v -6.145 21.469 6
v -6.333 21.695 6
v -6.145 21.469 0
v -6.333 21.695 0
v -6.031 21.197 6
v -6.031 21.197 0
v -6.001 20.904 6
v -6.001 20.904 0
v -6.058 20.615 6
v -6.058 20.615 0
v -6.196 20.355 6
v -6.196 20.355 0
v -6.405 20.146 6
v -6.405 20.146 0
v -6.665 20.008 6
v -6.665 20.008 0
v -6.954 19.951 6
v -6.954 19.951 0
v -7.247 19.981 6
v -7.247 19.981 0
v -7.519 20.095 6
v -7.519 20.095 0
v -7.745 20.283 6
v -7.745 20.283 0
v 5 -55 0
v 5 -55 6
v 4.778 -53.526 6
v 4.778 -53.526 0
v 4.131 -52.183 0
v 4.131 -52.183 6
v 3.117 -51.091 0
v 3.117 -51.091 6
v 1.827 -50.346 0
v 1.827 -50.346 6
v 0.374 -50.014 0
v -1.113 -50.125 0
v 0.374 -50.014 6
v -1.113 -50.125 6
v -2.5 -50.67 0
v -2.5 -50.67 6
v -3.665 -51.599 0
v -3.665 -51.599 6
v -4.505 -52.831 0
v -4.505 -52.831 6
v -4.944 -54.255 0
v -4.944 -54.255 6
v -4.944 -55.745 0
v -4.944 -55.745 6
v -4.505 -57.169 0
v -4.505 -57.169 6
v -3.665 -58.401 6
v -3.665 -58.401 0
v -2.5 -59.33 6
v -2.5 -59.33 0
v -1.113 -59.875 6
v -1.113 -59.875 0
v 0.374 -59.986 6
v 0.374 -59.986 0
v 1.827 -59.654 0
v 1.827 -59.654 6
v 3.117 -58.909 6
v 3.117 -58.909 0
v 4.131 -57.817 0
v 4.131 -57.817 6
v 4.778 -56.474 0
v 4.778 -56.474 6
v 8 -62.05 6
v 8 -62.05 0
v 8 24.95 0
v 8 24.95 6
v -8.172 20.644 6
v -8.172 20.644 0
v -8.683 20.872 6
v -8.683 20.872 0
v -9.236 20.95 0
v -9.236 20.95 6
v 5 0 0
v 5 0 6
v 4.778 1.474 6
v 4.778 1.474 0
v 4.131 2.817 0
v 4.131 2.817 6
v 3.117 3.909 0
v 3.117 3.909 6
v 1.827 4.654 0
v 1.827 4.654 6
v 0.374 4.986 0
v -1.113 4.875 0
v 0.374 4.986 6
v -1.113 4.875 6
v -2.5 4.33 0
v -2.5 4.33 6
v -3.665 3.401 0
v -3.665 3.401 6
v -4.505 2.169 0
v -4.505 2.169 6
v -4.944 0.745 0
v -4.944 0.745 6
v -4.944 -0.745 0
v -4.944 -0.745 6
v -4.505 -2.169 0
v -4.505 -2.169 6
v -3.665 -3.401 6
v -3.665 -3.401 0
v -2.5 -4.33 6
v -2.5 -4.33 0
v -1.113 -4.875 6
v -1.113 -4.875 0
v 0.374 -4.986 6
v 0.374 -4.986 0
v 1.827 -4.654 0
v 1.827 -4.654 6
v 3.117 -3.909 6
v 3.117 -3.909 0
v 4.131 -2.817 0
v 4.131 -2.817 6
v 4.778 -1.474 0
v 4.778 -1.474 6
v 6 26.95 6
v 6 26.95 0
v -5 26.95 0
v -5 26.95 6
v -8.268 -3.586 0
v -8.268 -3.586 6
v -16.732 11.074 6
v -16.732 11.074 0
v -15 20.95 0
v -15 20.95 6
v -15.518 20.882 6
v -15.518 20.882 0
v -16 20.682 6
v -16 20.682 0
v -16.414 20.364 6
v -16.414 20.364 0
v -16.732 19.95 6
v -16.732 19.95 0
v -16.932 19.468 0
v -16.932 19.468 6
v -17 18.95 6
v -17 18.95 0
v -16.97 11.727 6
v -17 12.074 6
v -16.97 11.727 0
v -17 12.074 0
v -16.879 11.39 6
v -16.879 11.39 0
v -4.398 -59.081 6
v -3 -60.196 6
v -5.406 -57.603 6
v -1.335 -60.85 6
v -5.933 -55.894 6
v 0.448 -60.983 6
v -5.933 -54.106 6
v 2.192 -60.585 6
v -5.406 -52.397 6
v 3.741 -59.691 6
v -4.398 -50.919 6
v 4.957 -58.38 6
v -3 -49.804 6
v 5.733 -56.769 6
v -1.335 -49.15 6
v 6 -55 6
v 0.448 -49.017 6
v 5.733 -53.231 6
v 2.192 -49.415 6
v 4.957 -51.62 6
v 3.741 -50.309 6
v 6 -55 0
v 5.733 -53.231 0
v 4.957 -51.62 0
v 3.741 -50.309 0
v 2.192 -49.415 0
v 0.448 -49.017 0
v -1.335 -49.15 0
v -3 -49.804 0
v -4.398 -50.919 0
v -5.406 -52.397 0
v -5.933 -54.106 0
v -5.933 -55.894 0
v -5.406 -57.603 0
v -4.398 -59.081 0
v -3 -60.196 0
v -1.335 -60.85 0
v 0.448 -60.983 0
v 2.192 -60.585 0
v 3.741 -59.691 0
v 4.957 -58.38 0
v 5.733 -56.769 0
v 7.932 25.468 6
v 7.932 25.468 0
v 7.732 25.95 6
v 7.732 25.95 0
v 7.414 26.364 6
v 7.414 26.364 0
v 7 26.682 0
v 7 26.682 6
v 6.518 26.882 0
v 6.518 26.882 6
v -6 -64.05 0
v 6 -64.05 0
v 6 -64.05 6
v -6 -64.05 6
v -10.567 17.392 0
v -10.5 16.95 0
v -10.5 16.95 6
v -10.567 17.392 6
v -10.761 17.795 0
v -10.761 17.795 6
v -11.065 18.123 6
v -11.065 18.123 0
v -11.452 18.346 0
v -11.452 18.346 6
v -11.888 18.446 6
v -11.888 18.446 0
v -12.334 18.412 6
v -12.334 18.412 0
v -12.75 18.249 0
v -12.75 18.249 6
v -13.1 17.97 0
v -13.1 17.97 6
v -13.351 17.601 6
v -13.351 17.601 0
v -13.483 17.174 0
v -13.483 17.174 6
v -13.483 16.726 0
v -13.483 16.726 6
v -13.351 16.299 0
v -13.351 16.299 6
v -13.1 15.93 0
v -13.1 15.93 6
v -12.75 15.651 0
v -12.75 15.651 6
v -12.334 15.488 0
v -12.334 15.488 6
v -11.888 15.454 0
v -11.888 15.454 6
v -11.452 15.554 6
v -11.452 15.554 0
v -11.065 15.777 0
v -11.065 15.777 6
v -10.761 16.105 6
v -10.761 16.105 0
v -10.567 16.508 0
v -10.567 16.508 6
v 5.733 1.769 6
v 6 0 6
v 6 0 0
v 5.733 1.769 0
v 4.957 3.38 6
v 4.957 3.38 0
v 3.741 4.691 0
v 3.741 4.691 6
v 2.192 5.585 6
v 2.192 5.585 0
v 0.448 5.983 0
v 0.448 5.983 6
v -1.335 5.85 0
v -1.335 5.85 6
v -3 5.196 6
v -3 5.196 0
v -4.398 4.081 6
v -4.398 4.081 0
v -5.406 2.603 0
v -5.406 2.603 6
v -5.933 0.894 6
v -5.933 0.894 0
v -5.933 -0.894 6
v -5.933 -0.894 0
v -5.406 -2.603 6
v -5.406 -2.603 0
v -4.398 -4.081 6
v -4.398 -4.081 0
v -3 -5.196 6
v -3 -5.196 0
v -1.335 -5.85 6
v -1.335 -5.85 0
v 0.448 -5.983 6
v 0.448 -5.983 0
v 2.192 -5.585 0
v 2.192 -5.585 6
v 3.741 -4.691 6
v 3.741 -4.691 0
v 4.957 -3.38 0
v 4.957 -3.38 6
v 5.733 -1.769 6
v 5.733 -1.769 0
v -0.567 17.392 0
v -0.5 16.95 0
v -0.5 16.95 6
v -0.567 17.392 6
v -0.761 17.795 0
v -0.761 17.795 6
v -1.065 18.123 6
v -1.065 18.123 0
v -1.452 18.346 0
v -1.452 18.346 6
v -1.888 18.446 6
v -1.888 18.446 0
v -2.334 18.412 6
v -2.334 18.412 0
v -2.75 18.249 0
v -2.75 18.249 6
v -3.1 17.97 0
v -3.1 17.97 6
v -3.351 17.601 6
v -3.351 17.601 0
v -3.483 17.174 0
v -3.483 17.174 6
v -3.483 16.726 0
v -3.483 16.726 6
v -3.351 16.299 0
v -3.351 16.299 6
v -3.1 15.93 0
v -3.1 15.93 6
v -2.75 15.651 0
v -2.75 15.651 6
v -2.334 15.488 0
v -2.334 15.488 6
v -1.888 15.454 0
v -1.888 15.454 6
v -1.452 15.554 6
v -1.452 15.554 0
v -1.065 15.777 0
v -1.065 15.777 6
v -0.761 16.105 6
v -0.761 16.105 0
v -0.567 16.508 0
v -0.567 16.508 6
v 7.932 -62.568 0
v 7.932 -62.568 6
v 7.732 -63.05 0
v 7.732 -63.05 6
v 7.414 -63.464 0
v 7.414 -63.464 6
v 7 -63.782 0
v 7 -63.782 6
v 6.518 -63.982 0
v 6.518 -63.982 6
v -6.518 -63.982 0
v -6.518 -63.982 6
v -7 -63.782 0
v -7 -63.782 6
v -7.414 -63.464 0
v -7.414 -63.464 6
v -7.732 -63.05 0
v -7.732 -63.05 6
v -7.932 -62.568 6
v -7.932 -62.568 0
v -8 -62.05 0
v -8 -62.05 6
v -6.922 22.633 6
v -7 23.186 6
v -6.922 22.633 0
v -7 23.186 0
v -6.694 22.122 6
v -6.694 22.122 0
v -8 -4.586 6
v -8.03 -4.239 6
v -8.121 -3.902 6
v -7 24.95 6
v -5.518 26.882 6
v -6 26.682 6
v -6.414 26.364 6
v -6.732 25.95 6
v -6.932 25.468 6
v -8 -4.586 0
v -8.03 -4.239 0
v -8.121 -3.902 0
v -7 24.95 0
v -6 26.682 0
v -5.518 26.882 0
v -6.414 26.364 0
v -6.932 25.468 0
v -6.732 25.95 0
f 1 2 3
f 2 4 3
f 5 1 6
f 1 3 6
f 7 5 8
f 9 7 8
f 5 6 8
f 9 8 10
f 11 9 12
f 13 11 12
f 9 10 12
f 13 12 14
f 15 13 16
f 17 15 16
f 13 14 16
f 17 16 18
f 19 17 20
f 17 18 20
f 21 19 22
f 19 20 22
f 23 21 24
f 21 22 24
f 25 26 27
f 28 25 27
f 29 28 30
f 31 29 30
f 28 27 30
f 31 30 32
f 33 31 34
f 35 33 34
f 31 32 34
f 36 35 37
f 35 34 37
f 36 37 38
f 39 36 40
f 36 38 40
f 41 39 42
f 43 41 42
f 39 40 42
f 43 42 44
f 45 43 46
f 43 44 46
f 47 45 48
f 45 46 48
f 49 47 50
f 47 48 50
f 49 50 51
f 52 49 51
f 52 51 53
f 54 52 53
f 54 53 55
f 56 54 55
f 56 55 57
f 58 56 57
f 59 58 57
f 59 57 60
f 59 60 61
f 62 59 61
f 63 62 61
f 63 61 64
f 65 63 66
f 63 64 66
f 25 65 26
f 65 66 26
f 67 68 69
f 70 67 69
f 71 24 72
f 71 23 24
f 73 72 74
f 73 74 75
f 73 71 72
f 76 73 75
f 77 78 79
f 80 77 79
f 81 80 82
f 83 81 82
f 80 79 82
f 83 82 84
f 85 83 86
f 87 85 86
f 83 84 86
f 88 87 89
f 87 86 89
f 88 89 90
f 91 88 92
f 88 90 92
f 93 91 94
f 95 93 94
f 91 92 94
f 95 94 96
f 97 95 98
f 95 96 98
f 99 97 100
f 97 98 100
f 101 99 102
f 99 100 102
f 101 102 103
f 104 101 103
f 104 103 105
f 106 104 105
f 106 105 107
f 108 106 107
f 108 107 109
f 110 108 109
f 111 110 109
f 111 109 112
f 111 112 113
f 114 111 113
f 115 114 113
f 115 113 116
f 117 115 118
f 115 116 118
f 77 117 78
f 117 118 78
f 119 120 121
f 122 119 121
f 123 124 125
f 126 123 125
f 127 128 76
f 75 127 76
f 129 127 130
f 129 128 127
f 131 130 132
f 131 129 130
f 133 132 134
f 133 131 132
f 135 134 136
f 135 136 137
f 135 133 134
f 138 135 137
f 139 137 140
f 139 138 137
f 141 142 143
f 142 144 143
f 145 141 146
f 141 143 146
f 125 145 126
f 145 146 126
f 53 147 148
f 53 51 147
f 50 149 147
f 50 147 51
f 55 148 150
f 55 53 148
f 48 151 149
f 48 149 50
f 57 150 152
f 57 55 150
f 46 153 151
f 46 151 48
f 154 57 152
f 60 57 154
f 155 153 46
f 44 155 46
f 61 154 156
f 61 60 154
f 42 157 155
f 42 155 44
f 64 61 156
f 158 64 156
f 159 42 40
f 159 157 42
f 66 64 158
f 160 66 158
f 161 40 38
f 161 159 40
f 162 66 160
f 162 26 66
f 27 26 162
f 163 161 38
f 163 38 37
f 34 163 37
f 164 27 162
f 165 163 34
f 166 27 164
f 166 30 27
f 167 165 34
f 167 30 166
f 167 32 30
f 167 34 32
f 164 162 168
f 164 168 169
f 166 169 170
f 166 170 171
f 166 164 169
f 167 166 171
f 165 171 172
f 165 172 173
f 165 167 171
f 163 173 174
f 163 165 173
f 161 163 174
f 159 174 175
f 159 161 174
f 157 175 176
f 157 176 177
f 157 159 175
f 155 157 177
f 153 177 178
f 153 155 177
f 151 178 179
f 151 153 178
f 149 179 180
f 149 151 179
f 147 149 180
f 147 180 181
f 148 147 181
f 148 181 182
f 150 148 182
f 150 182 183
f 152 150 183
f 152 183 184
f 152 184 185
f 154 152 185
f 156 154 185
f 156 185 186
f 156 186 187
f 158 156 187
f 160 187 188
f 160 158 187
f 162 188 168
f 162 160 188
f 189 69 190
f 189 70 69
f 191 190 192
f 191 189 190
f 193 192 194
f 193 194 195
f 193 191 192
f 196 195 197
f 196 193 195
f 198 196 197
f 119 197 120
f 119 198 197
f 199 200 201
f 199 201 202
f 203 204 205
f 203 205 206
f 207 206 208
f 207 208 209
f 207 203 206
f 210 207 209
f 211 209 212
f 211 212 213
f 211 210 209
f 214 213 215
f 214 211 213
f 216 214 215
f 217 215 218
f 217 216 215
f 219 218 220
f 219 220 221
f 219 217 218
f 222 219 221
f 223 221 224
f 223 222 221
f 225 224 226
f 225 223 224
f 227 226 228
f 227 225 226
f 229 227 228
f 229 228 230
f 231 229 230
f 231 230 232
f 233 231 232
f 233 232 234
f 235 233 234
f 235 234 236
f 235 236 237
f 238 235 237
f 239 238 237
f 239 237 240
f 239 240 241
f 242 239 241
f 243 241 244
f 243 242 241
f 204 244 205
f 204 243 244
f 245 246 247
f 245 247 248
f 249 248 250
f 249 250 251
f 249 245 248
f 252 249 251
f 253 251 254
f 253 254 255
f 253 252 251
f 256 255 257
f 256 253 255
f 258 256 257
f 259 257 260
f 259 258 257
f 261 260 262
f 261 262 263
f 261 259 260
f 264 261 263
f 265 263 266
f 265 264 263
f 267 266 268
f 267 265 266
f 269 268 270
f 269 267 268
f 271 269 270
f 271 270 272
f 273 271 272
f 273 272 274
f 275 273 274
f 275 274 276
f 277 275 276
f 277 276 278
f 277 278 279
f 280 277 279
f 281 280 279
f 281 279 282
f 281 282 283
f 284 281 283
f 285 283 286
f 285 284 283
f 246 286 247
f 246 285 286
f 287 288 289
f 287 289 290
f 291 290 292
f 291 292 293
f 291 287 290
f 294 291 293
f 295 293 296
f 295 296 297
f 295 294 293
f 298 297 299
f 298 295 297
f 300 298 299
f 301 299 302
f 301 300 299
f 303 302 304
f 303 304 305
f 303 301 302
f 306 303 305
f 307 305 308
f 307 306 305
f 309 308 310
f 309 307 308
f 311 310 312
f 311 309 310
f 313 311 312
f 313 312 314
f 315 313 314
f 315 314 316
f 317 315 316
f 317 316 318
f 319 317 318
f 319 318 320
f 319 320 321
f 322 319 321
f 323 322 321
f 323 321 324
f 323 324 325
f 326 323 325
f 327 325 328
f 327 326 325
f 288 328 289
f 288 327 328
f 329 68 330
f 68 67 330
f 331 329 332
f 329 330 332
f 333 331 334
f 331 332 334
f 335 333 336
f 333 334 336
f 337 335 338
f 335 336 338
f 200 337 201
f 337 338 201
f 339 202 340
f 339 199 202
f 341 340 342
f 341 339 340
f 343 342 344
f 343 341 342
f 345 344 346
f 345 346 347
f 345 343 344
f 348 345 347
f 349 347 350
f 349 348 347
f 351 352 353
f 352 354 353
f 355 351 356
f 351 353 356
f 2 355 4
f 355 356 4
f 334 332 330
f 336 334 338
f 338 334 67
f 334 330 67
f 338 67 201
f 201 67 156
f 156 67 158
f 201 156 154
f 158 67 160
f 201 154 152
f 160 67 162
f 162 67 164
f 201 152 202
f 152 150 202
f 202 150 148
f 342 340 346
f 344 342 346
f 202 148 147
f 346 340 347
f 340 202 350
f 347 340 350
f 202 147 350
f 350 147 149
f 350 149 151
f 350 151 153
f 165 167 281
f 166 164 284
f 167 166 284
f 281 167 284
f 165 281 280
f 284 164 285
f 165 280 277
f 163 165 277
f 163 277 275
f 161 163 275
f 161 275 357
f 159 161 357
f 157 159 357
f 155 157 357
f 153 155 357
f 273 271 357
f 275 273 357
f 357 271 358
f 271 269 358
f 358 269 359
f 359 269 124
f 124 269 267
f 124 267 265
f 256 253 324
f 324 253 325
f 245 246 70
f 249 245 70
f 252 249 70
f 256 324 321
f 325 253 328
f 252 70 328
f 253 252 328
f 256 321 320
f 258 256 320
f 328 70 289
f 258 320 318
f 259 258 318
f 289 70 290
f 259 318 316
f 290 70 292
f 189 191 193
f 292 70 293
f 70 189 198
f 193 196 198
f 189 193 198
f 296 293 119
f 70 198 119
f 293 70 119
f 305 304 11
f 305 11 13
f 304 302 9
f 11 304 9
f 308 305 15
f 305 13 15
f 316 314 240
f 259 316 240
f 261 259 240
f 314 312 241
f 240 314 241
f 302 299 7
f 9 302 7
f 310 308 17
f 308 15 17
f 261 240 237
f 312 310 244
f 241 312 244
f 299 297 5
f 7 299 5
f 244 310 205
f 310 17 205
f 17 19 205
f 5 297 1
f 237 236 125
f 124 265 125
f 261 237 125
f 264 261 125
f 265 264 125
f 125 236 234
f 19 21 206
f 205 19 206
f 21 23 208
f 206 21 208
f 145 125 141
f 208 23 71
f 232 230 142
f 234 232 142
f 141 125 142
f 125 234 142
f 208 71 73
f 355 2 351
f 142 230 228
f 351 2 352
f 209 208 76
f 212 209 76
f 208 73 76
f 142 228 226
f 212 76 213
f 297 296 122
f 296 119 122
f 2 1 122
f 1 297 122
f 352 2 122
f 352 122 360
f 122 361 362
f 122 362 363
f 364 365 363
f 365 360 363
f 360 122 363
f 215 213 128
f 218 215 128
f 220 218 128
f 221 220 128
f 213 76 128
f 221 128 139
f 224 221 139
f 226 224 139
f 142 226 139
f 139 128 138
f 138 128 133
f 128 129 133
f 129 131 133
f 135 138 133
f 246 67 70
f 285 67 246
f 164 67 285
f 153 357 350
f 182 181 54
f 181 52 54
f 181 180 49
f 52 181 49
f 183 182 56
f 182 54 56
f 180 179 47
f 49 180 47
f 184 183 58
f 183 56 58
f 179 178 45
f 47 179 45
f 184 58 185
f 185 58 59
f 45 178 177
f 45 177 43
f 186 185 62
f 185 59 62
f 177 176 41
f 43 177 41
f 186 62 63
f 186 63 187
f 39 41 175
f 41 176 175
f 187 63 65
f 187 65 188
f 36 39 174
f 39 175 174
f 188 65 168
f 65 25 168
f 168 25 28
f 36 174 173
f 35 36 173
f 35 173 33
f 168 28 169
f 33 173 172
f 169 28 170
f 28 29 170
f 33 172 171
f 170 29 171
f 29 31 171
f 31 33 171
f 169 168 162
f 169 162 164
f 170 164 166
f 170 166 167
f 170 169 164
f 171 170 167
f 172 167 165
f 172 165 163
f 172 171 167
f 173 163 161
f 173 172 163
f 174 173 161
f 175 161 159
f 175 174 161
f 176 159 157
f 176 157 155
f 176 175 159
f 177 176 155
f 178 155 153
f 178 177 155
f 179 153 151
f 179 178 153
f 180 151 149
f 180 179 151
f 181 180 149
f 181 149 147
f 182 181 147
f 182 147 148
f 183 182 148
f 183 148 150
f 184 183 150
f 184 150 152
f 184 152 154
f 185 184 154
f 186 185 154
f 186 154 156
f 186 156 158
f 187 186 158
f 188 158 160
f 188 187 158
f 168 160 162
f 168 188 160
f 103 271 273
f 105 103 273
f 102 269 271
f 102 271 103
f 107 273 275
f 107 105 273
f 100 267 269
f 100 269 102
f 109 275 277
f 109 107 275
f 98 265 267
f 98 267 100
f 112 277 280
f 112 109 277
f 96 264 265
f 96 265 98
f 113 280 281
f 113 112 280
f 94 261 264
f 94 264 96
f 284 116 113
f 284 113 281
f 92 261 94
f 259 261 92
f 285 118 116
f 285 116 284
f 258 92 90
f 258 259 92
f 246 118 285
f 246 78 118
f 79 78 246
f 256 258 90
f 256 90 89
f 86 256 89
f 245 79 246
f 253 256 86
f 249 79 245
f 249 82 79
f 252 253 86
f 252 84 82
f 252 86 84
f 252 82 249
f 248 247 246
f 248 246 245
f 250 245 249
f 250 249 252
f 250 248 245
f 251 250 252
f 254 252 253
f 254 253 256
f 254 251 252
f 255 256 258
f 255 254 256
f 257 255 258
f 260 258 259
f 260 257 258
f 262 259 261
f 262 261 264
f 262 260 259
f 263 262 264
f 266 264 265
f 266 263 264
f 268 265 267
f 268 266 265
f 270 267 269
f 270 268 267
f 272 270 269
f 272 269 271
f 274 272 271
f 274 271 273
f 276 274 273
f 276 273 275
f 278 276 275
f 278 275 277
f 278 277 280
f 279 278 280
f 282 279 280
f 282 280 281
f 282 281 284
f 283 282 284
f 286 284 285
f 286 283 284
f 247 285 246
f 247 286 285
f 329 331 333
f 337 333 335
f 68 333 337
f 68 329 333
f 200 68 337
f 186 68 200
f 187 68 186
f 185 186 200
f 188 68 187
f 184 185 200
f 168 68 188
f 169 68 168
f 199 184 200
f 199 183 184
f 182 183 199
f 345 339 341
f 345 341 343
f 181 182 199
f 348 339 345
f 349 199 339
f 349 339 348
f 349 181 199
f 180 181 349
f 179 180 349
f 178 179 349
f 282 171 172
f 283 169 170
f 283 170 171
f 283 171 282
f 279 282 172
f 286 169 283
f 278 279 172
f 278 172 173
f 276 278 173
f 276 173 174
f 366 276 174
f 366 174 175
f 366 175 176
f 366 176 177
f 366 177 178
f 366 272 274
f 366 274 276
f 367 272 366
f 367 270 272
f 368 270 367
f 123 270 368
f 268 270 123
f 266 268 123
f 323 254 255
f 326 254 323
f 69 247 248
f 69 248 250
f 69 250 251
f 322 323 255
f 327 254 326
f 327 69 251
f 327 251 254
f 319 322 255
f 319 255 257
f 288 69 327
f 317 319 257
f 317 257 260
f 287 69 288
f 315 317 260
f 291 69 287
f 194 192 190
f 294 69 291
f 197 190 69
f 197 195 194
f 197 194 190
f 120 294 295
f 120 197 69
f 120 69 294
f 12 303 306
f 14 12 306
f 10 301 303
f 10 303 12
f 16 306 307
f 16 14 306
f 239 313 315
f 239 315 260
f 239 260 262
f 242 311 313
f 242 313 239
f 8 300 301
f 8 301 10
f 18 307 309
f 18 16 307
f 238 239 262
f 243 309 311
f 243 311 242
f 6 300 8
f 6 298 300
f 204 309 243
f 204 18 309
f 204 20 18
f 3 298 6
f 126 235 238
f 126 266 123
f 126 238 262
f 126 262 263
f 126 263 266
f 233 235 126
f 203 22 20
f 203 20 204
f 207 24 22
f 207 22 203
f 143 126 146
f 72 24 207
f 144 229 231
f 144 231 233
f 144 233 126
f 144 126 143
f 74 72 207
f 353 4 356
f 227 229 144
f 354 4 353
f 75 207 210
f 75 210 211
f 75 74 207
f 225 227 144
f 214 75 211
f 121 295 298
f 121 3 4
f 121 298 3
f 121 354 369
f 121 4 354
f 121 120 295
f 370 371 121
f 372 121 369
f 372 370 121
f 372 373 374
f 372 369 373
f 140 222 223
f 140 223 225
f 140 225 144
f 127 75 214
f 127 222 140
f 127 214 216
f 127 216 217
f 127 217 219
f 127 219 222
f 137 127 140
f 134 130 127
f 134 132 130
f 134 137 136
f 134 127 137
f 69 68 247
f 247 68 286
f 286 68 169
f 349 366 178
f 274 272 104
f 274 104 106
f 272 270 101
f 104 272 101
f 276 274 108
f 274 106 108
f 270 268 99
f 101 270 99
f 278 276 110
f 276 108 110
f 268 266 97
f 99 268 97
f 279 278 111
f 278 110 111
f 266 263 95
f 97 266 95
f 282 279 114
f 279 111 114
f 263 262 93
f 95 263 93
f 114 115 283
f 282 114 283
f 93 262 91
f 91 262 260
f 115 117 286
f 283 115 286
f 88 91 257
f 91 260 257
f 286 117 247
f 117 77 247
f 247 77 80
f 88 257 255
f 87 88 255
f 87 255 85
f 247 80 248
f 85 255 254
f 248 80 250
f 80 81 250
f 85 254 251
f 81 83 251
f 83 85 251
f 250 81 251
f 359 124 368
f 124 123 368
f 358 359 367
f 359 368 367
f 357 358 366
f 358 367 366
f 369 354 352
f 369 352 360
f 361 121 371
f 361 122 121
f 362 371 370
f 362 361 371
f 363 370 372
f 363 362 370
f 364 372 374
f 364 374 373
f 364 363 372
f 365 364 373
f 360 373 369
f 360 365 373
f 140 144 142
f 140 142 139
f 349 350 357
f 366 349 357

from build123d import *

# Parameters (mm, degrees)
SKETCH_1_R          = 6
SKETCH_1_R_2        = 1.5
EXTRUDE_1_DEPTH     = 6
SKETCH_2_R          = 6
SKETCH_2_R_2        = 5
EXTRUDE_2_DEPTH     = 6
EXTRUDE_2_2_DEPTH   = 6
SKETCH_3_R          = 8
SKETCH_3_R_2        = 5
EXTRUDE_3_DEPTH     = 0.5
EXTRUDE_3_2_DEPTH   = 0.5
SKETCH_4_R          = 8
SKETCH_4_R_2        = 5
EXTRUDE_4_DEPTH     = 0.5
EXTRUDE_4_2_DEPTH   = 0.5
SKETCH_5_W          = 15
SKETCH_5_H          = 6
EXTRUDE_5_DEPTH     = 6
SKETCH_6_R          = 1
CUT_EXTRUDE_1_DEPTH = 6
CUT_EXTRUDE_4_DEPTH = 6
FILLET_5_R          = 2


with BuildPart() as part:
    # 草图1 → 凸台-拉伸1 (new body)
    with BuildSketch(Plane.XY):
        Polygon((8, 20.95), (8, -64.05), (-12, -64.05), (-17, -35.693590902), (-17, 20.95), align=None)
        Circle(SKETCH_1_R, mode=Mode.SUBTRACT)
        with Locations((0, -55)):
            Circle(SKETCH_1_R, mode=Mode.SUBTRACT)
        with Locations((-2, 16.95)):
            Circle(SKETCH_1_R_2, mode=Mode.SUBTRACT)
        with Locations((-12, 16.95)):
            Circle(SKETCH_1_R_2, mode=Mode.SUBTRACT)
    extrude(amount=EXTRUDE_1_DEPTH)

    # 草图5 → 凸台-拉伸5 (add)
    with BuildSketch(Plane(origin=(0, 0, 0), x_dir=(-1, 0, 0), z_dir=(0, 0, -1))):
        with Locations((-0.5, 23.95)):
            Rectangle(SKETCH_5_W, SKETCH_5_H)
    extrude(amount=-EXTRUDE_5_DEPTH)

    # 草图6 → 切除-拉伸1 (cut)
    with BuildSketch(Plane(origin=(0, 0, 0), x_dir=(-1, 0, 0), z_dir=(0, 0, -1))):
        with Locations((7, 20.95)):
            Circle(SKETCH_6_R)
    extrude(amount=-CUT_EXTRUDE_1_DEPTH, mode=Mode.SUBTRACT)

    # 草图9 → 切除-拉伸4 (cut)
    with BuildSketch(Plane.XY.offset(6)):
        Polygon((-12, -64.05), (-8, -64.05), (-8, -4.05), (-17, 11.538457268), (-17, -35.693590902), align=None)
    extrude(amount=-CUT_EXTRUDE_4_DEPTH, mode=Mode.SUBTRACT)

    # 圆角5
    fillet_5_edges = [part.edges().sort_by_distance(p)[0] for p in [
        (8, 26.95, 3),
        (-7, 26.95, 3),
        (-7, 21.95, 3),
        (-8, 20.95, 3),
        (-8, -4.05, 3),
        (-8, -64.05, 3),
        (-17, 11.538457268, 3),
        (8, -64.05, 3),
        (-17, 20.95, 3),
    ]]
    fillet(fillet_5_edges, radius=FILLET_5_R)


with BuildPart() as body_2:
    # 草图2 → 凸台-拉伸2 (new body)
    with BuildSketch(Plane.XY.offset(6)):
        with Locations((0, -55)):
            Circle(SKETCH_2_R)
        with Locations((0, -55)):
            Circle(SKETCH_2_R_2, mode=Mode.SUBTRACT)
    extrude(amount=-EXTRUDE_2_DEPTH)


with BuildPart() as body_3:
    # 草图2 → Extrude 2 2 (new body)
    with BuildSketch(Plane.XY.offset(6)):
        Circle(SKETCH_2_R)
        Circle(SKETCH_2_R_2, mode=Mode.SUBTRACT)
    extrude(amount=-EXTRUDE_2_2_DEPTH)


with BuildPart() as body_4:
    # 草图3 → 凸台-拉伸3 (new body)
    with BuildSketch(Plane.XY.offset(6)):
        Circle(SKETCH_3_R)
        Circle(SKETCH_3_R_2, mode=Mode.SUBTRACT)
    extrude(amount=EXTRUDE_3_DEPTH)


with BuildPart() as body_5:
    # 草图3 → Extrude 3 2 (new body)
    with BuildSketch(Plane.XY.offset(6)):
        with Locations((0, -55)):
            Circle(SKETCH_3_R)
        with Locations((0, -55)):
            Circle(SKETCH_3_R_2, mode=Mode.SUBTRACT)
    extrude(amount=EXTRUDE_3_2_DEPTH)


with BuildPart() as body_6:
    # 草图4 → 凸台-拉伸4 (new body)
    with BuildSketch(Plane(origin=(0, 0, 0), x_dir=(-1, 0, 0), z_dir=(0, 0, -1))):
        with Locations(Location((0, -55, 0), (0, 0, 180))):
            Circle(SKETCH_4_R)
        with Locations(Location((0, -55, 0), (0, 0, 180))):
            Circle(SKETCH_4_R_2, mode=Mode.SUBTRACT)
    extrude(amount=EXTRUDE_4_DEPTH)


with BuildPart() as body_7:
    # 草图4 → Extrude 4 2 (new body)
    with BuildSketch(Plane(origin=(0, 0, 0), x_dir=(-1, 0, 0), z_dir=(0, 0, -1))):
        with Locations(Location((0, 0, 0), (0, 0, 180))):
            Circle(SKETCH_4_R)
        with Locations(Location((0, 0, 0), (0, 0, 180))):
            Circle(SKETCH_4_R_2, mode=Mode.SUBTRACT)
    extrude(amount=EXTRUDE_4_2_DEPTH)


solid = Compound([part.part, body_2.part, body_3.part])
